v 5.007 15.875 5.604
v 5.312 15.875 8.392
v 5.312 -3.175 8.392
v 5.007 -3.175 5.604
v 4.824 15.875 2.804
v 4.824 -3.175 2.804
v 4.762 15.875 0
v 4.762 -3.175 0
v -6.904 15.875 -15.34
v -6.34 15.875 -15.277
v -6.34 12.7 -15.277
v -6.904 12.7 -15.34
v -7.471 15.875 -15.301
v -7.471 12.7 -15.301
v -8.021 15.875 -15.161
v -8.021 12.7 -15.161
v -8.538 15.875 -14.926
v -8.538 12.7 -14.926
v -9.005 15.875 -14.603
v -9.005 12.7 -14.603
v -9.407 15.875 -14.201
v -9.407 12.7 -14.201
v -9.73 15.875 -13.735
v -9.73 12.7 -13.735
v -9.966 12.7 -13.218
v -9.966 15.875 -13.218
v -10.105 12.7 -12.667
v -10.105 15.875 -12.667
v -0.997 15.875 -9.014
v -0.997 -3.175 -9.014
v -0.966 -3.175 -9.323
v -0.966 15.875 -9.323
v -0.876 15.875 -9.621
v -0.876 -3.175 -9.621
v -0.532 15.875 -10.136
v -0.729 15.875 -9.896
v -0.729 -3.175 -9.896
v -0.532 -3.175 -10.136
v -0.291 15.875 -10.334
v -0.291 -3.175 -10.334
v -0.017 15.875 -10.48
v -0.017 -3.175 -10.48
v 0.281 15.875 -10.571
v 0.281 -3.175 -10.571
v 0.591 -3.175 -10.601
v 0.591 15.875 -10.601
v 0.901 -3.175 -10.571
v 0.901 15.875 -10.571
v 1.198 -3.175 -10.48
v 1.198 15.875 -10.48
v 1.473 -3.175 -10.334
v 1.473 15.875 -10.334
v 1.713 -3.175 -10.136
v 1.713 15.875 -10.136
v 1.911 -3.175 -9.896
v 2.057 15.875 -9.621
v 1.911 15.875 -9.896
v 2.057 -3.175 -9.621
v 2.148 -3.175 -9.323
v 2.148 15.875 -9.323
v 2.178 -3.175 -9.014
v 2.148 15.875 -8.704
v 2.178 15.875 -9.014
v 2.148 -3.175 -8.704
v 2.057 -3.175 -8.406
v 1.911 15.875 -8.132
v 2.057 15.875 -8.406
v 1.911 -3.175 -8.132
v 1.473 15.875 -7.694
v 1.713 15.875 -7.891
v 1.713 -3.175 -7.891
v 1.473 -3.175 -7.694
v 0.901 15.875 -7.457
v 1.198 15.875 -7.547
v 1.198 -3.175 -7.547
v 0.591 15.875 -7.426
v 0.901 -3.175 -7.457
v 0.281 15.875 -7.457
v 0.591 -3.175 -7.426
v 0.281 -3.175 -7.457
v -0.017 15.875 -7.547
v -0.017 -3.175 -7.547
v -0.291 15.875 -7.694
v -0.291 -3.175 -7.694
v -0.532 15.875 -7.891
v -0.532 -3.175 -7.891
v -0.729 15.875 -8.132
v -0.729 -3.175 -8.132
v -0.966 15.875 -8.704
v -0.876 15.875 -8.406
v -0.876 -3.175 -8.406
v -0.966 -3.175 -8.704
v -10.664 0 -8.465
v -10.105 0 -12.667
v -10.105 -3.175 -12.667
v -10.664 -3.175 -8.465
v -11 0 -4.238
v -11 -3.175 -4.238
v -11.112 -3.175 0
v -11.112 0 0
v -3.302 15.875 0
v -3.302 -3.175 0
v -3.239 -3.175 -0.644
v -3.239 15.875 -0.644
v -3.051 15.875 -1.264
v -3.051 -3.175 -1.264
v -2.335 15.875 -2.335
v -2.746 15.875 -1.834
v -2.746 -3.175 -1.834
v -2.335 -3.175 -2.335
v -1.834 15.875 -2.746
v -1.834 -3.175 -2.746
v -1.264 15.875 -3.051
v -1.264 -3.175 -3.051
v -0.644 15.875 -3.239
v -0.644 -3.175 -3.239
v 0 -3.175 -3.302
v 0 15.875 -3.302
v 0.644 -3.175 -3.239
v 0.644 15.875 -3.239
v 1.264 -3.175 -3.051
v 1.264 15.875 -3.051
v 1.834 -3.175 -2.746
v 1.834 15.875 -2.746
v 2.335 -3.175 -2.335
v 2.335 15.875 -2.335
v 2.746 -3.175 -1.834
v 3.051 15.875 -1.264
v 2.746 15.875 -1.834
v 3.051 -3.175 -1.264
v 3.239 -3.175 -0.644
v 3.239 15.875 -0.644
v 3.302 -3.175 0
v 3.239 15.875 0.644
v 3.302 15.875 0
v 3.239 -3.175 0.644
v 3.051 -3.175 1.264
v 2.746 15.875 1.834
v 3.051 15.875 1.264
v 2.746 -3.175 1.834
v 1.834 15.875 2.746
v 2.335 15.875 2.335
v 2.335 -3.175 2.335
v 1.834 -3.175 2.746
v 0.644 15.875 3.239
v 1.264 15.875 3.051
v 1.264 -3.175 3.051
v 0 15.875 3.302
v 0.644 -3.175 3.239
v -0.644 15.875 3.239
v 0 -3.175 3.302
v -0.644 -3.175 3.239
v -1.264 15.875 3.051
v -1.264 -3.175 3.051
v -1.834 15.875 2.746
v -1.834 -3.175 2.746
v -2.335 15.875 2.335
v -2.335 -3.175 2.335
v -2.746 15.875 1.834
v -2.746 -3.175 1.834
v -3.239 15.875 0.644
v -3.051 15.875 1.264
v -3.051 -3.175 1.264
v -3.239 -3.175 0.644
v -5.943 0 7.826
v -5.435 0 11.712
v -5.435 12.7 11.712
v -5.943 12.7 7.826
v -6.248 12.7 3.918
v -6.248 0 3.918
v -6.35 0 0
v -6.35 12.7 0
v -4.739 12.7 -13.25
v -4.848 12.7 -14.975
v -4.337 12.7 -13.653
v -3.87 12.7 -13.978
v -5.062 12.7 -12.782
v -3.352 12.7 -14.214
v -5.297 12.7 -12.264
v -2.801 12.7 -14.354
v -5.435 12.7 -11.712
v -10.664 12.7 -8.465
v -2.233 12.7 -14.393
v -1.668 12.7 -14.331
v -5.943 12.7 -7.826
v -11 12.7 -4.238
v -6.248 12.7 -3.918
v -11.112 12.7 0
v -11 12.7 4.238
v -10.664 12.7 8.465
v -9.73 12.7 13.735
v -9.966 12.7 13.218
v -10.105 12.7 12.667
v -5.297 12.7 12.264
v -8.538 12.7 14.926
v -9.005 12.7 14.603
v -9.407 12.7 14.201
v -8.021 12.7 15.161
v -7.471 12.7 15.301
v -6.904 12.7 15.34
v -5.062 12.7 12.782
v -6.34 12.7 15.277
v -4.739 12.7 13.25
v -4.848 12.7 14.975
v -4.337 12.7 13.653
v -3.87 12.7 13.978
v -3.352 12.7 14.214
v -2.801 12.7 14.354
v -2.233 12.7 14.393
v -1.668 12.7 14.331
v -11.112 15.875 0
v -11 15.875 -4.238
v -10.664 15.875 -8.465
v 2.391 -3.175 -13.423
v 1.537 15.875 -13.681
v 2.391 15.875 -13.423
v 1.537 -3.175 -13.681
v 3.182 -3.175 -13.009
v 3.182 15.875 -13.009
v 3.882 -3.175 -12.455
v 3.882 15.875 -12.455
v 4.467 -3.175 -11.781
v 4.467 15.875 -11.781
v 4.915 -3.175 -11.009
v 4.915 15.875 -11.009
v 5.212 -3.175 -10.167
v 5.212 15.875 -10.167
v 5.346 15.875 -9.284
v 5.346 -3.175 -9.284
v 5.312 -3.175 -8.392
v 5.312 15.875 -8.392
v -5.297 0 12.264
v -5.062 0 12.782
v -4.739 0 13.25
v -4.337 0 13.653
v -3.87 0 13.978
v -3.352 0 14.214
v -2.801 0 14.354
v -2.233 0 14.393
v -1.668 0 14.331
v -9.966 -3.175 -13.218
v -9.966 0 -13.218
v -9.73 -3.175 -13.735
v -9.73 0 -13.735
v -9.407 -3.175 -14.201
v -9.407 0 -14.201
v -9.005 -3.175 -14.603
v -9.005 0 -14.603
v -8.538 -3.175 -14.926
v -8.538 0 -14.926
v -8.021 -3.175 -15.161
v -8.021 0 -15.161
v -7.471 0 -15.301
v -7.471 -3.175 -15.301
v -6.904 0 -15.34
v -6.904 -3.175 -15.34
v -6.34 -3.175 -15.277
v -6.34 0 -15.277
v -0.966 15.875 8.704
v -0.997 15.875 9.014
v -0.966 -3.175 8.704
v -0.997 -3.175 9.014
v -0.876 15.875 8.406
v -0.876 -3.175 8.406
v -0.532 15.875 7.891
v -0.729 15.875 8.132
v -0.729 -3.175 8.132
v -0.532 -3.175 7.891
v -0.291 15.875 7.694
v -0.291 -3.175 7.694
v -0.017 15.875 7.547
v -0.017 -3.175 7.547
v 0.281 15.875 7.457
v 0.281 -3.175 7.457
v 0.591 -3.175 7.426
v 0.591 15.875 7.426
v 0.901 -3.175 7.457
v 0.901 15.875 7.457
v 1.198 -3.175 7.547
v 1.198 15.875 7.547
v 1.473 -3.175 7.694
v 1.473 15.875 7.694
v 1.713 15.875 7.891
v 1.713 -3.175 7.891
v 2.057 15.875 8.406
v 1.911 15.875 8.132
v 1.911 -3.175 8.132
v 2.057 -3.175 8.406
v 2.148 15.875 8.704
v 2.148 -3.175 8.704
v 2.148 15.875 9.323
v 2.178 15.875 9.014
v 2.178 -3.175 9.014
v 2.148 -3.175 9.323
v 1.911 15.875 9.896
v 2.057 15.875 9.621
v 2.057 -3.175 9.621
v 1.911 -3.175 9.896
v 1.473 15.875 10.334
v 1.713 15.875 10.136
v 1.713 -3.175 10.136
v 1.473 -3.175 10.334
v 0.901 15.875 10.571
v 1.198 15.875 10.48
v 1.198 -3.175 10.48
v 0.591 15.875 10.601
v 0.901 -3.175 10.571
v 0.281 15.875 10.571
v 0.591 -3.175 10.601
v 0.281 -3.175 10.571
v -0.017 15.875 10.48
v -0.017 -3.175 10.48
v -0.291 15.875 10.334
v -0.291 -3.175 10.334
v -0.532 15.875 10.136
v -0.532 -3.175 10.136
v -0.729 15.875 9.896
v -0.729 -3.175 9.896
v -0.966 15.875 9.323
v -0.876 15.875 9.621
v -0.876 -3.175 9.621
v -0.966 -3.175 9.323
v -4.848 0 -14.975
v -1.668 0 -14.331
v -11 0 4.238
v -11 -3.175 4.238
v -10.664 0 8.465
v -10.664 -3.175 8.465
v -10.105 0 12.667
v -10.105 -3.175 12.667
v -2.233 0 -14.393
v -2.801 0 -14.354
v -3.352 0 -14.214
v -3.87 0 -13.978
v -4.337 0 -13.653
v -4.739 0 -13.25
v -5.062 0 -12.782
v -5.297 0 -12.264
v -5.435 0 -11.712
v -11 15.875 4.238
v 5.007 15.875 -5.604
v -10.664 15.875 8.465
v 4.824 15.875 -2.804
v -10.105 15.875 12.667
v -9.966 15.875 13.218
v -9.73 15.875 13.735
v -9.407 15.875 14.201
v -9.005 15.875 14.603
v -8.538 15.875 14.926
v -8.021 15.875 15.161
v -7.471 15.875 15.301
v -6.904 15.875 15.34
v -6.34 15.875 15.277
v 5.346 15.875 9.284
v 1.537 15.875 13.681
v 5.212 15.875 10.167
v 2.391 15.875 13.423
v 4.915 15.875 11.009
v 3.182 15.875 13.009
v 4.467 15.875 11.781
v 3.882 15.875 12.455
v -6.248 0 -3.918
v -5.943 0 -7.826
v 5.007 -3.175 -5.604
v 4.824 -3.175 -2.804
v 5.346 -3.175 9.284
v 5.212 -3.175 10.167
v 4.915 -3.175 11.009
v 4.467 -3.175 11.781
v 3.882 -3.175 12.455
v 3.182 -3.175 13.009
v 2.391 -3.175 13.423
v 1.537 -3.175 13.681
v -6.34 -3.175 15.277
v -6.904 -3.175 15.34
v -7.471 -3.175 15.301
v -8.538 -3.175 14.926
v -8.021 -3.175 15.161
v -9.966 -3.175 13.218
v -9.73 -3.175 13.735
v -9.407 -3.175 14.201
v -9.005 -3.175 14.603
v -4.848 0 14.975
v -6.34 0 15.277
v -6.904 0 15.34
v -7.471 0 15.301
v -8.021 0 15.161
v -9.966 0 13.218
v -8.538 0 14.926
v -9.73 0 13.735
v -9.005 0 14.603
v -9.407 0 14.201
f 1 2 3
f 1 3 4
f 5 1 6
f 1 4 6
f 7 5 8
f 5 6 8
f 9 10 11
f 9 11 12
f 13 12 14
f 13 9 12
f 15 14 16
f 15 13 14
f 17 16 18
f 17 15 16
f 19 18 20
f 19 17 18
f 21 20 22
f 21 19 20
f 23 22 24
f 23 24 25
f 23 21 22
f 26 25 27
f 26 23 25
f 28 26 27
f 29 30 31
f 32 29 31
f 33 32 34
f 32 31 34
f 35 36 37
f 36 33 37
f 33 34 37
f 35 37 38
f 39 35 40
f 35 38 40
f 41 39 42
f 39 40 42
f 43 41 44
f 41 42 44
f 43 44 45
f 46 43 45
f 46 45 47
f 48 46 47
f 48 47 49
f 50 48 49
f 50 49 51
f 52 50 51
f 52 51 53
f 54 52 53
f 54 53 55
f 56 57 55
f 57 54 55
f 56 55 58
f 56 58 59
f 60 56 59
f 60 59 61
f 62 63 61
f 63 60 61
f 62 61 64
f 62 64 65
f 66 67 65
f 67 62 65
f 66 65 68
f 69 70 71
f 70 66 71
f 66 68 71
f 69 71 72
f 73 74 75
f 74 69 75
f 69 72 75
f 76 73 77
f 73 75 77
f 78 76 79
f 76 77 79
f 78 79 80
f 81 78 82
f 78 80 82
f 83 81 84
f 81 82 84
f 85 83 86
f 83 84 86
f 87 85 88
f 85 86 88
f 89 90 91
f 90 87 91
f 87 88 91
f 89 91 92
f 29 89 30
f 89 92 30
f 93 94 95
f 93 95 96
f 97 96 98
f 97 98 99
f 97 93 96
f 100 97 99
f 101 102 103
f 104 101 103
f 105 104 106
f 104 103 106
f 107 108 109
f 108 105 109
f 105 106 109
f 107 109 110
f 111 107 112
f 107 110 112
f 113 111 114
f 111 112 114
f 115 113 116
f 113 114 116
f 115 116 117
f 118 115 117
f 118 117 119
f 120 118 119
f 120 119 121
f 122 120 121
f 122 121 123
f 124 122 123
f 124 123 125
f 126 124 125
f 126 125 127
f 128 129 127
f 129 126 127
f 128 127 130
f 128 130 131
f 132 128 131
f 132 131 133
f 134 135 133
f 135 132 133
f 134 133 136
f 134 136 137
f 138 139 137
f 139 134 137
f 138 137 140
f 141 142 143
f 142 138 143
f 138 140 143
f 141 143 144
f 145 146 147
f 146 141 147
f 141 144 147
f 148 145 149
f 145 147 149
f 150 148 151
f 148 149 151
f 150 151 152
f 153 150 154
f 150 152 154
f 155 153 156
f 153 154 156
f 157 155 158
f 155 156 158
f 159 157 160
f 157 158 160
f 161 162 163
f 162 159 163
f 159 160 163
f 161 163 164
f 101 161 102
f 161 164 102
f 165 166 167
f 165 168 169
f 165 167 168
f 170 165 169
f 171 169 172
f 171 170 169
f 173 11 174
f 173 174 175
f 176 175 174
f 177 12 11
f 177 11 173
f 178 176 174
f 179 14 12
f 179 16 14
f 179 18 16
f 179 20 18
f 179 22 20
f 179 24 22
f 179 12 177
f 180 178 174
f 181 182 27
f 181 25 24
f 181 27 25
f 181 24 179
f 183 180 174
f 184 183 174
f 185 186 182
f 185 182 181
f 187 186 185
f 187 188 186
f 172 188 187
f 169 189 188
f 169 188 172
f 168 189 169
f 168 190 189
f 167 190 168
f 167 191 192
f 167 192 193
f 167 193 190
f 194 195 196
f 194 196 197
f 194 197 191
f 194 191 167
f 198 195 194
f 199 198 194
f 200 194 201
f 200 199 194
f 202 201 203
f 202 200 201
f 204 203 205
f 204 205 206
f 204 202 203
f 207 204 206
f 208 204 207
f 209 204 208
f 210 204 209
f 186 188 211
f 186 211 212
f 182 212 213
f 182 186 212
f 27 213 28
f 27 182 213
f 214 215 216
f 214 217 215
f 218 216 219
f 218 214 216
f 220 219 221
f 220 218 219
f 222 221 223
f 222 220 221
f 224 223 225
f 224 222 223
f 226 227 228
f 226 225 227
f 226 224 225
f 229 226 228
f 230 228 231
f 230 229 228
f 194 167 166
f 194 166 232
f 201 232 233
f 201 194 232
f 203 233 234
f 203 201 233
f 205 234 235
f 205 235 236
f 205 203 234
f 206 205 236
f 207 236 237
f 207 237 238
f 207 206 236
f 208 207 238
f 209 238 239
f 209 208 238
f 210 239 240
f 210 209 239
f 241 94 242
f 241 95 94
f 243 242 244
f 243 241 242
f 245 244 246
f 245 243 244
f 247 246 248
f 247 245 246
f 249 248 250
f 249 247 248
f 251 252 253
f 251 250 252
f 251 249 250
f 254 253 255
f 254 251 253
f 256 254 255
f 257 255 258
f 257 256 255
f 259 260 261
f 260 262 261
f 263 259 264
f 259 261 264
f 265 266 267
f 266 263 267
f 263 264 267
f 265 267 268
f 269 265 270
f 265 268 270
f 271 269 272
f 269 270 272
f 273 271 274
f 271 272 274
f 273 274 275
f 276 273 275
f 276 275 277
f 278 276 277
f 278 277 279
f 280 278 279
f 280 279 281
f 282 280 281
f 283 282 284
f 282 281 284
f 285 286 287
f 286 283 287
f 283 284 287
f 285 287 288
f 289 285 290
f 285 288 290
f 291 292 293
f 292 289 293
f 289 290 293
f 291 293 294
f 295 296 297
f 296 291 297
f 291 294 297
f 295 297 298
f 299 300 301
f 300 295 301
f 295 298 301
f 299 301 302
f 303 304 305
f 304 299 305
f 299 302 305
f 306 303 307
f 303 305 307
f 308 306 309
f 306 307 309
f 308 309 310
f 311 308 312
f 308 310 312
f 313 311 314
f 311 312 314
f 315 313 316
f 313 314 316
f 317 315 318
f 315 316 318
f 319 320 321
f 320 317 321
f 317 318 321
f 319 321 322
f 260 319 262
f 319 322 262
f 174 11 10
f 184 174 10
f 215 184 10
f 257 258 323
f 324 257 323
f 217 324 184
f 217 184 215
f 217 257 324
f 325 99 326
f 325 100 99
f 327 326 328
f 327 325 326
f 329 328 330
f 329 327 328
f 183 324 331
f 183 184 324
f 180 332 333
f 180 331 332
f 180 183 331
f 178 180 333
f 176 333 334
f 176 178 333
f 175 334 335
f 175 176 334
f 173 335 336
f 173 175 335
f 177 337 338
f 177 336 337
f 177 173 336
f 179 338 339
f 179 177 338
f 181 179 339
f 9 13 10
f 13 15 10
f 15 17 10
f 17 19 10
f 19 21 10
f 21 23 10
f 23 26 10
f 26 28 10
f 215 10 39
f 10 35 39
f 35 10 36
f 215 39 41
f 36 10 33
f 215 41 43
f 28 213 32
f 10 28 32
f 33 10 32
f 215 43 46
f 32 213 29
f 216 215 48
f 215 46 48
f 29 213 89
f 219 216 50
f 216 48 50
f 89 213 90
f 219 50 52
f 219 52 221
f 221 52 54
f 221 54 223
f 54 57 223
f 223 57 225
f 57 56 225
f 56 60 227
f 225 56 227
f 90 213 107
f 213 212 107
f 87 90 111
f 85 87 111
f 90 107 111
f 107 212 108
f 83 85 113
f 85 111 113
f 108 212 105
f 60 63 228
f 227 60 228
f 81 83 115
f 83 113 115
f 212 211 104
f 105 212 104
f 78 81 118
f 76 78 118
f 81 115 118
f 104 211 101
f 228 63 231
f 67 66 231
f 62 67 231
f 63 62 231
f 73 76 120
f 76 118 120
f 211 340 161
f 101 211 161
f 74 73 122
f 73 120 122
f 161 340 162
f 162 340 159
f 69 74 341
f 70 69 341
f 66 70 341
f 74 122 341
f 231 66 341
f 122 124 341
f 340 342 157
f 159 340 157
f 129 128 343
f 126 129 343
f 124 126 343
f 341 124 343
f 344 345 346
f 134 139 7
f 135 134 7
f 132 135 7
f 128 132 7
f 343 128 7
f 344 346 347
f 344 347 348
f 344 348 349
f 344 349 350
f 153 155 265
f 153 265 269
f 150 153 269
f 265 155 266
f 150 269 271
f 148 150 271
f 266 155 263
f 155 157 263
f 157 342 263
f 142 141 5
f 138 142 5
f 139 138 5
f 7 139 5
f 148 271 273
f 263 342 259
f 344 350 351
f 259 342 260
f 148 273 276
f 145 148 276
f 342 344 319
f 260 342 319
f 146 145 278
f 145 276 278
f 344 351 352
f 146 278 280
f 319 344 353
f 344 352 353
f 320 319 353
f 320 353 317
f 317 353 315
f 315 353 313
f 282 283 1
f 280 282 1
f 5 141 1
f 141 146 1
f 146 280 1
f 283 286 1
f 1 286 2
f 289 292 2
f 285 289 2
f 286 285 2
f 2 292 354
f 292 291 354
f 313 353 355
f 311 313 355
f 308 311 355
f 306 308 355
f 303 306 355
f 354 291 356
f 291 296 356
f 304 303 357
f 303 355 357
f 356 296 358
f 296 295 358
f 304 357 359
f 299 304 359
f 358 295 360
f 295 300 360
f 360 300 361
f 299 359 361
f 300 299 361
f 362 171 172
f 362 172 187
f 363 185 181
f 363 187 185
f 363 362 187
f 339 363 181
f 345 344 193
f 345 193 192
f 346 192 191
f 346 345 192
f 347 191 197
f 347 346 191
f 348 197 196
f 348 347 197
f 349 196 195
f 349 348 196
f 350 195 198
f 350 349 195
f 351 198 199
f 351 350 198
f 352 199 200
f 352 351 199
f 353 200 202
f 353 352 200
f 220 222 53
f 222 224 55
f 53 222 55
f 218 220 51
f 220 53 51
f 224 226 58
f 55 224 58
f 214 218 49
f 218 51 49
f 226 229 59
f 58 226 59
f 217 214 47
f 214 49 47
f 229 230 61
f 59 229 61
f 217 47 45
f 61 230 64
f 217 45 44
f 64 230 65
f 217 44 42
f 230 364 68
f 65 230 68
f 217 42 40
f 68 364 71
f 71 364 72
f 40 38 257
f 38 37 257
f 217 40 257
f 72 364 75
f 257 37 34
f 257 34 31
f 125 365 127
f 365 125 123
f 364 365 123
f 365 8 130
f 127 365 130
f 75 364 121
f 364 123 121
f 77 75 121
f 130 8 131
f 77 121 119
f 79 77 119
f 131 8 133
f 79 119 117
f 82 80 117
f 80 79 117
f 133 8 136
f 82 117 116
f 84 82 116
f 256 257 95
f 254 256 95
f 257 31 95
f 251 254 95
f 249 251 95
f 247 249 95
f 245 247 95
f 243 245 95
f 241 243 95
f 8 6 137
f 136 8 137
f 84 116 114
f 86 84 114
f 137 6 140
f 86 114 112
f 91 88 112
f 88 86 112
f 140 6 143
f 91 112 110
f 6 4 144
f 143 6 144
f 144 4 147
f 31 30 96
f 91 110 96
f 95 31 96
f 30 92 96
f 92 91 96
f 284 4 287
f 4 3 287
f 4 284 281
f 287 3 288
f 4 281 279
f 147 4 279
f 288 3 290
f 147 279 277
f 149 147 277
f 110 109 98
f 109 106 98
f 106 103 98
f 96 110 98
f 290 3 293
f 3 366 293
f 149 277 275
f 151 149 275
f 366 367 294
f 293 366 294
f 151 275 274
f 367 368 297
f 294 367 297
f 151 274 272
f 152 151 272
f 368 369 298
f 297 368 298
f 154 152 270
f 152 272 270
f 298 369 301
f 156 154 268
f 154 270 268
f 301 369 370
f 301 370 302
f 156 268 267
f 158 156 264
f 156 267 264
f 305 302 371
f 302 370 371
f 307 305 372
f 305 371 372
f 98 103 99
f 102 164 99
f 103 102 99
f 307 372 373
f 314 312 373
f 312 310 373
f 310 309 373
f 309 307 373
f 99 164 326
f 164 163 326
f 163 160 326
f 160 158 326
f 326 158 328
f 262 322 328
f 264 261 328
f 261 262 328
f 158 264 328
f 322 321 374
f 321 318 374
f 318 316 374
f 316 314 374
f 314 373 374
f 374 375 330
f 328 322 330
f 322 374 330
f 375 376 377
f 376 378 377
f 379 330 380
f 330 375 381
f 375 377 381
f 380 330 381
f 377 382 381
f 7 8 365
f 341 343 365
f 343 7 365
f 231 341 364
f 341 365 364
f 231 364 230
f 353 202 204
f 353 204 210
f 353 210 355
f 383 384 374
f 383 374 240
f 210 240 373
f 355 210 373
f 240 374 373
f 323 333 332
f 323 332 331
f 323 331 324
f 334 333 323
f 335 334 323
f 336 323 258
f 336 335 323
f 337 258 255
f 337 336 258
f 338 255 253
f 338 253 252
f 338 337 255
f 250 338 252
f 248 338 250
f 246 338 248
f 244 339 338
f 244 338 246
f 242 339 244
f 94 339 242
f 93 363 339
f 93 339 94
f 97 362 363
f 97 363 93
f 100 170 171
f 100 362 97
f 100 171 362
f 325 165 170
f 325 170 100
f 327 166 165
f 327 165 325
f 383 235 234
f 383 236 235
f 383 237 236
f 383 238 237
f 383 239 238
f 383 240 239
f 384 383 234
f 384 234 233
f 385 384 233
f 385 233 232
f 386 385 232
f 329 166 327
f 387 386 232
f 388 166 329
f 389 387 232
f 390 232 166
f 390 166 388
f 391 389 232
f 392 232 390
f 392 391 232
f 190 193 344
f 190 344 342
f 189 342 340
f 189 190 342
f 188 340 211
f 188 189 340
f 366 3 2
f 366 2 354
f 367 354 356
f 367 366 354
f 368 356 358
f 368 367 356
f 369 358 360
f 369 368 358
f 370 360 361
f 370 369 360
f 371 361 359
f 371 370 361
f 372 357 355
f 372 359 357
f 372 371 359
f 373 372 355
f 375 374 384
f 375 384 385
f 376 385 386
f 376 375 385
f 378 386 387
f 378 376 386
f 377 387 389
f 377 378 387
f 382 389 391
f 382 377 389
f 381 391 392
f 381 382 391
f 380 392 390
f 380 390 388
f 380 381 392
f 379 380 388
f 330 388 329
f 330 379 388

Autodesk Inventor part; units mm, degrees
ref_plane "YZ Plane" through (0, 0, 0) normal (1, 0, 0) x (0, 1, 0)
ref_plane "XZ Plane" through (0, 0, 0) normal (0, 1, 0) x (-1, 0, 0)
sketch "Sketch1" plane through (0, 0, 0) normal (0, 1, 0) x (-1, 0, 0)
  circle A0 centre (0, 0) radius 3.302
  line L0 (0, 0) -> (3.302, 0)
  arc A1 (6.35, 0) -> (4.8481, 14.975) centre (-69.0563, 0) ccw
  circle A2 centre (-69.0563, 0) radius 69.0563 construction
  circle A3 centre (-0.5908, 9.0136) radius 1.5875
  line L1 (-0.5908, 9.0136) -> (-69.0563, 0) construction
  circle A4 centre (-0.5908, 9.0136) radius 4.7625
  line L2 (9.5157, 15.9208) -> (-1.5366, 13.6813)
  arc A5 (11.1125, 0) -> (9.5157, 15.9208) centre (-69.0563, 0) ccw
  arc A6 (-4.7625, 0) -> (-5.3125, 8.392) centre (-69.0563, 0) ccw
  line L3 (0, 0) -> (-69.0563, 0) construction
  arc A7 (4.8481, -14.975) -> (6.35, 0) centre (-69.0563, 0) ccw
  circle A8 centre (-0.5908, -9.0136) radius 1.5875
  circle A9 centre (-0.5908, -9.0136) radius 4.7625
  line L4 (9.5157, -15.9208) -> (-1.5366, -13.6813)
  arc A10 (9.5157, -15.9208) -> (11.1125, 0) centre (-69.0563, 0) ccw
  arc A11 (-5.3125, -8.392) -> (-4.7625, 0) centre (-69.0563, 0) ccw
  point P0 (4.8277, -15.4708)
  dimension "d0" = 6.604
  dimension "d1" = 6.35
  dimension "d2" = 75.4062
  dimension "d3" = 3.175
  dimension "d6" = 9.525
  dimension "d7" = 4.7625
  dimension "d8" = 7.5
  dimension "d14" = 138.1125
extrude "Extrusion1" add sketch "Sketch1" along normal blind 12.7 contours A7 L4 A9 A11 A6 A4 L2 A1 | A4 | A9
extrude "Extrusion2" add sketch "Sketch1" against normal blind 3.175
ref_plane "Work Plane1" through (0, 6.35, 0) normal (0, 1, 0) x (1, 0, 0)
mirror "Mirror1" about plane through (0, 6.35, 0) normal (0, 1, 0) of "Extrusion2"
fillet "Fillet1" radius 3.175 6 edges at (-9.5157, 14.2875, 15.9208) (-9.5157, 14.2875, -15.9208) (-9.5157, -1.5875, -15.9208) (-9.5157, -1.5875, 15.9208) (-4.8481, 6.35, 14.975) (-4.8481, 6.35, -14.975)
properties part number "Braces"
